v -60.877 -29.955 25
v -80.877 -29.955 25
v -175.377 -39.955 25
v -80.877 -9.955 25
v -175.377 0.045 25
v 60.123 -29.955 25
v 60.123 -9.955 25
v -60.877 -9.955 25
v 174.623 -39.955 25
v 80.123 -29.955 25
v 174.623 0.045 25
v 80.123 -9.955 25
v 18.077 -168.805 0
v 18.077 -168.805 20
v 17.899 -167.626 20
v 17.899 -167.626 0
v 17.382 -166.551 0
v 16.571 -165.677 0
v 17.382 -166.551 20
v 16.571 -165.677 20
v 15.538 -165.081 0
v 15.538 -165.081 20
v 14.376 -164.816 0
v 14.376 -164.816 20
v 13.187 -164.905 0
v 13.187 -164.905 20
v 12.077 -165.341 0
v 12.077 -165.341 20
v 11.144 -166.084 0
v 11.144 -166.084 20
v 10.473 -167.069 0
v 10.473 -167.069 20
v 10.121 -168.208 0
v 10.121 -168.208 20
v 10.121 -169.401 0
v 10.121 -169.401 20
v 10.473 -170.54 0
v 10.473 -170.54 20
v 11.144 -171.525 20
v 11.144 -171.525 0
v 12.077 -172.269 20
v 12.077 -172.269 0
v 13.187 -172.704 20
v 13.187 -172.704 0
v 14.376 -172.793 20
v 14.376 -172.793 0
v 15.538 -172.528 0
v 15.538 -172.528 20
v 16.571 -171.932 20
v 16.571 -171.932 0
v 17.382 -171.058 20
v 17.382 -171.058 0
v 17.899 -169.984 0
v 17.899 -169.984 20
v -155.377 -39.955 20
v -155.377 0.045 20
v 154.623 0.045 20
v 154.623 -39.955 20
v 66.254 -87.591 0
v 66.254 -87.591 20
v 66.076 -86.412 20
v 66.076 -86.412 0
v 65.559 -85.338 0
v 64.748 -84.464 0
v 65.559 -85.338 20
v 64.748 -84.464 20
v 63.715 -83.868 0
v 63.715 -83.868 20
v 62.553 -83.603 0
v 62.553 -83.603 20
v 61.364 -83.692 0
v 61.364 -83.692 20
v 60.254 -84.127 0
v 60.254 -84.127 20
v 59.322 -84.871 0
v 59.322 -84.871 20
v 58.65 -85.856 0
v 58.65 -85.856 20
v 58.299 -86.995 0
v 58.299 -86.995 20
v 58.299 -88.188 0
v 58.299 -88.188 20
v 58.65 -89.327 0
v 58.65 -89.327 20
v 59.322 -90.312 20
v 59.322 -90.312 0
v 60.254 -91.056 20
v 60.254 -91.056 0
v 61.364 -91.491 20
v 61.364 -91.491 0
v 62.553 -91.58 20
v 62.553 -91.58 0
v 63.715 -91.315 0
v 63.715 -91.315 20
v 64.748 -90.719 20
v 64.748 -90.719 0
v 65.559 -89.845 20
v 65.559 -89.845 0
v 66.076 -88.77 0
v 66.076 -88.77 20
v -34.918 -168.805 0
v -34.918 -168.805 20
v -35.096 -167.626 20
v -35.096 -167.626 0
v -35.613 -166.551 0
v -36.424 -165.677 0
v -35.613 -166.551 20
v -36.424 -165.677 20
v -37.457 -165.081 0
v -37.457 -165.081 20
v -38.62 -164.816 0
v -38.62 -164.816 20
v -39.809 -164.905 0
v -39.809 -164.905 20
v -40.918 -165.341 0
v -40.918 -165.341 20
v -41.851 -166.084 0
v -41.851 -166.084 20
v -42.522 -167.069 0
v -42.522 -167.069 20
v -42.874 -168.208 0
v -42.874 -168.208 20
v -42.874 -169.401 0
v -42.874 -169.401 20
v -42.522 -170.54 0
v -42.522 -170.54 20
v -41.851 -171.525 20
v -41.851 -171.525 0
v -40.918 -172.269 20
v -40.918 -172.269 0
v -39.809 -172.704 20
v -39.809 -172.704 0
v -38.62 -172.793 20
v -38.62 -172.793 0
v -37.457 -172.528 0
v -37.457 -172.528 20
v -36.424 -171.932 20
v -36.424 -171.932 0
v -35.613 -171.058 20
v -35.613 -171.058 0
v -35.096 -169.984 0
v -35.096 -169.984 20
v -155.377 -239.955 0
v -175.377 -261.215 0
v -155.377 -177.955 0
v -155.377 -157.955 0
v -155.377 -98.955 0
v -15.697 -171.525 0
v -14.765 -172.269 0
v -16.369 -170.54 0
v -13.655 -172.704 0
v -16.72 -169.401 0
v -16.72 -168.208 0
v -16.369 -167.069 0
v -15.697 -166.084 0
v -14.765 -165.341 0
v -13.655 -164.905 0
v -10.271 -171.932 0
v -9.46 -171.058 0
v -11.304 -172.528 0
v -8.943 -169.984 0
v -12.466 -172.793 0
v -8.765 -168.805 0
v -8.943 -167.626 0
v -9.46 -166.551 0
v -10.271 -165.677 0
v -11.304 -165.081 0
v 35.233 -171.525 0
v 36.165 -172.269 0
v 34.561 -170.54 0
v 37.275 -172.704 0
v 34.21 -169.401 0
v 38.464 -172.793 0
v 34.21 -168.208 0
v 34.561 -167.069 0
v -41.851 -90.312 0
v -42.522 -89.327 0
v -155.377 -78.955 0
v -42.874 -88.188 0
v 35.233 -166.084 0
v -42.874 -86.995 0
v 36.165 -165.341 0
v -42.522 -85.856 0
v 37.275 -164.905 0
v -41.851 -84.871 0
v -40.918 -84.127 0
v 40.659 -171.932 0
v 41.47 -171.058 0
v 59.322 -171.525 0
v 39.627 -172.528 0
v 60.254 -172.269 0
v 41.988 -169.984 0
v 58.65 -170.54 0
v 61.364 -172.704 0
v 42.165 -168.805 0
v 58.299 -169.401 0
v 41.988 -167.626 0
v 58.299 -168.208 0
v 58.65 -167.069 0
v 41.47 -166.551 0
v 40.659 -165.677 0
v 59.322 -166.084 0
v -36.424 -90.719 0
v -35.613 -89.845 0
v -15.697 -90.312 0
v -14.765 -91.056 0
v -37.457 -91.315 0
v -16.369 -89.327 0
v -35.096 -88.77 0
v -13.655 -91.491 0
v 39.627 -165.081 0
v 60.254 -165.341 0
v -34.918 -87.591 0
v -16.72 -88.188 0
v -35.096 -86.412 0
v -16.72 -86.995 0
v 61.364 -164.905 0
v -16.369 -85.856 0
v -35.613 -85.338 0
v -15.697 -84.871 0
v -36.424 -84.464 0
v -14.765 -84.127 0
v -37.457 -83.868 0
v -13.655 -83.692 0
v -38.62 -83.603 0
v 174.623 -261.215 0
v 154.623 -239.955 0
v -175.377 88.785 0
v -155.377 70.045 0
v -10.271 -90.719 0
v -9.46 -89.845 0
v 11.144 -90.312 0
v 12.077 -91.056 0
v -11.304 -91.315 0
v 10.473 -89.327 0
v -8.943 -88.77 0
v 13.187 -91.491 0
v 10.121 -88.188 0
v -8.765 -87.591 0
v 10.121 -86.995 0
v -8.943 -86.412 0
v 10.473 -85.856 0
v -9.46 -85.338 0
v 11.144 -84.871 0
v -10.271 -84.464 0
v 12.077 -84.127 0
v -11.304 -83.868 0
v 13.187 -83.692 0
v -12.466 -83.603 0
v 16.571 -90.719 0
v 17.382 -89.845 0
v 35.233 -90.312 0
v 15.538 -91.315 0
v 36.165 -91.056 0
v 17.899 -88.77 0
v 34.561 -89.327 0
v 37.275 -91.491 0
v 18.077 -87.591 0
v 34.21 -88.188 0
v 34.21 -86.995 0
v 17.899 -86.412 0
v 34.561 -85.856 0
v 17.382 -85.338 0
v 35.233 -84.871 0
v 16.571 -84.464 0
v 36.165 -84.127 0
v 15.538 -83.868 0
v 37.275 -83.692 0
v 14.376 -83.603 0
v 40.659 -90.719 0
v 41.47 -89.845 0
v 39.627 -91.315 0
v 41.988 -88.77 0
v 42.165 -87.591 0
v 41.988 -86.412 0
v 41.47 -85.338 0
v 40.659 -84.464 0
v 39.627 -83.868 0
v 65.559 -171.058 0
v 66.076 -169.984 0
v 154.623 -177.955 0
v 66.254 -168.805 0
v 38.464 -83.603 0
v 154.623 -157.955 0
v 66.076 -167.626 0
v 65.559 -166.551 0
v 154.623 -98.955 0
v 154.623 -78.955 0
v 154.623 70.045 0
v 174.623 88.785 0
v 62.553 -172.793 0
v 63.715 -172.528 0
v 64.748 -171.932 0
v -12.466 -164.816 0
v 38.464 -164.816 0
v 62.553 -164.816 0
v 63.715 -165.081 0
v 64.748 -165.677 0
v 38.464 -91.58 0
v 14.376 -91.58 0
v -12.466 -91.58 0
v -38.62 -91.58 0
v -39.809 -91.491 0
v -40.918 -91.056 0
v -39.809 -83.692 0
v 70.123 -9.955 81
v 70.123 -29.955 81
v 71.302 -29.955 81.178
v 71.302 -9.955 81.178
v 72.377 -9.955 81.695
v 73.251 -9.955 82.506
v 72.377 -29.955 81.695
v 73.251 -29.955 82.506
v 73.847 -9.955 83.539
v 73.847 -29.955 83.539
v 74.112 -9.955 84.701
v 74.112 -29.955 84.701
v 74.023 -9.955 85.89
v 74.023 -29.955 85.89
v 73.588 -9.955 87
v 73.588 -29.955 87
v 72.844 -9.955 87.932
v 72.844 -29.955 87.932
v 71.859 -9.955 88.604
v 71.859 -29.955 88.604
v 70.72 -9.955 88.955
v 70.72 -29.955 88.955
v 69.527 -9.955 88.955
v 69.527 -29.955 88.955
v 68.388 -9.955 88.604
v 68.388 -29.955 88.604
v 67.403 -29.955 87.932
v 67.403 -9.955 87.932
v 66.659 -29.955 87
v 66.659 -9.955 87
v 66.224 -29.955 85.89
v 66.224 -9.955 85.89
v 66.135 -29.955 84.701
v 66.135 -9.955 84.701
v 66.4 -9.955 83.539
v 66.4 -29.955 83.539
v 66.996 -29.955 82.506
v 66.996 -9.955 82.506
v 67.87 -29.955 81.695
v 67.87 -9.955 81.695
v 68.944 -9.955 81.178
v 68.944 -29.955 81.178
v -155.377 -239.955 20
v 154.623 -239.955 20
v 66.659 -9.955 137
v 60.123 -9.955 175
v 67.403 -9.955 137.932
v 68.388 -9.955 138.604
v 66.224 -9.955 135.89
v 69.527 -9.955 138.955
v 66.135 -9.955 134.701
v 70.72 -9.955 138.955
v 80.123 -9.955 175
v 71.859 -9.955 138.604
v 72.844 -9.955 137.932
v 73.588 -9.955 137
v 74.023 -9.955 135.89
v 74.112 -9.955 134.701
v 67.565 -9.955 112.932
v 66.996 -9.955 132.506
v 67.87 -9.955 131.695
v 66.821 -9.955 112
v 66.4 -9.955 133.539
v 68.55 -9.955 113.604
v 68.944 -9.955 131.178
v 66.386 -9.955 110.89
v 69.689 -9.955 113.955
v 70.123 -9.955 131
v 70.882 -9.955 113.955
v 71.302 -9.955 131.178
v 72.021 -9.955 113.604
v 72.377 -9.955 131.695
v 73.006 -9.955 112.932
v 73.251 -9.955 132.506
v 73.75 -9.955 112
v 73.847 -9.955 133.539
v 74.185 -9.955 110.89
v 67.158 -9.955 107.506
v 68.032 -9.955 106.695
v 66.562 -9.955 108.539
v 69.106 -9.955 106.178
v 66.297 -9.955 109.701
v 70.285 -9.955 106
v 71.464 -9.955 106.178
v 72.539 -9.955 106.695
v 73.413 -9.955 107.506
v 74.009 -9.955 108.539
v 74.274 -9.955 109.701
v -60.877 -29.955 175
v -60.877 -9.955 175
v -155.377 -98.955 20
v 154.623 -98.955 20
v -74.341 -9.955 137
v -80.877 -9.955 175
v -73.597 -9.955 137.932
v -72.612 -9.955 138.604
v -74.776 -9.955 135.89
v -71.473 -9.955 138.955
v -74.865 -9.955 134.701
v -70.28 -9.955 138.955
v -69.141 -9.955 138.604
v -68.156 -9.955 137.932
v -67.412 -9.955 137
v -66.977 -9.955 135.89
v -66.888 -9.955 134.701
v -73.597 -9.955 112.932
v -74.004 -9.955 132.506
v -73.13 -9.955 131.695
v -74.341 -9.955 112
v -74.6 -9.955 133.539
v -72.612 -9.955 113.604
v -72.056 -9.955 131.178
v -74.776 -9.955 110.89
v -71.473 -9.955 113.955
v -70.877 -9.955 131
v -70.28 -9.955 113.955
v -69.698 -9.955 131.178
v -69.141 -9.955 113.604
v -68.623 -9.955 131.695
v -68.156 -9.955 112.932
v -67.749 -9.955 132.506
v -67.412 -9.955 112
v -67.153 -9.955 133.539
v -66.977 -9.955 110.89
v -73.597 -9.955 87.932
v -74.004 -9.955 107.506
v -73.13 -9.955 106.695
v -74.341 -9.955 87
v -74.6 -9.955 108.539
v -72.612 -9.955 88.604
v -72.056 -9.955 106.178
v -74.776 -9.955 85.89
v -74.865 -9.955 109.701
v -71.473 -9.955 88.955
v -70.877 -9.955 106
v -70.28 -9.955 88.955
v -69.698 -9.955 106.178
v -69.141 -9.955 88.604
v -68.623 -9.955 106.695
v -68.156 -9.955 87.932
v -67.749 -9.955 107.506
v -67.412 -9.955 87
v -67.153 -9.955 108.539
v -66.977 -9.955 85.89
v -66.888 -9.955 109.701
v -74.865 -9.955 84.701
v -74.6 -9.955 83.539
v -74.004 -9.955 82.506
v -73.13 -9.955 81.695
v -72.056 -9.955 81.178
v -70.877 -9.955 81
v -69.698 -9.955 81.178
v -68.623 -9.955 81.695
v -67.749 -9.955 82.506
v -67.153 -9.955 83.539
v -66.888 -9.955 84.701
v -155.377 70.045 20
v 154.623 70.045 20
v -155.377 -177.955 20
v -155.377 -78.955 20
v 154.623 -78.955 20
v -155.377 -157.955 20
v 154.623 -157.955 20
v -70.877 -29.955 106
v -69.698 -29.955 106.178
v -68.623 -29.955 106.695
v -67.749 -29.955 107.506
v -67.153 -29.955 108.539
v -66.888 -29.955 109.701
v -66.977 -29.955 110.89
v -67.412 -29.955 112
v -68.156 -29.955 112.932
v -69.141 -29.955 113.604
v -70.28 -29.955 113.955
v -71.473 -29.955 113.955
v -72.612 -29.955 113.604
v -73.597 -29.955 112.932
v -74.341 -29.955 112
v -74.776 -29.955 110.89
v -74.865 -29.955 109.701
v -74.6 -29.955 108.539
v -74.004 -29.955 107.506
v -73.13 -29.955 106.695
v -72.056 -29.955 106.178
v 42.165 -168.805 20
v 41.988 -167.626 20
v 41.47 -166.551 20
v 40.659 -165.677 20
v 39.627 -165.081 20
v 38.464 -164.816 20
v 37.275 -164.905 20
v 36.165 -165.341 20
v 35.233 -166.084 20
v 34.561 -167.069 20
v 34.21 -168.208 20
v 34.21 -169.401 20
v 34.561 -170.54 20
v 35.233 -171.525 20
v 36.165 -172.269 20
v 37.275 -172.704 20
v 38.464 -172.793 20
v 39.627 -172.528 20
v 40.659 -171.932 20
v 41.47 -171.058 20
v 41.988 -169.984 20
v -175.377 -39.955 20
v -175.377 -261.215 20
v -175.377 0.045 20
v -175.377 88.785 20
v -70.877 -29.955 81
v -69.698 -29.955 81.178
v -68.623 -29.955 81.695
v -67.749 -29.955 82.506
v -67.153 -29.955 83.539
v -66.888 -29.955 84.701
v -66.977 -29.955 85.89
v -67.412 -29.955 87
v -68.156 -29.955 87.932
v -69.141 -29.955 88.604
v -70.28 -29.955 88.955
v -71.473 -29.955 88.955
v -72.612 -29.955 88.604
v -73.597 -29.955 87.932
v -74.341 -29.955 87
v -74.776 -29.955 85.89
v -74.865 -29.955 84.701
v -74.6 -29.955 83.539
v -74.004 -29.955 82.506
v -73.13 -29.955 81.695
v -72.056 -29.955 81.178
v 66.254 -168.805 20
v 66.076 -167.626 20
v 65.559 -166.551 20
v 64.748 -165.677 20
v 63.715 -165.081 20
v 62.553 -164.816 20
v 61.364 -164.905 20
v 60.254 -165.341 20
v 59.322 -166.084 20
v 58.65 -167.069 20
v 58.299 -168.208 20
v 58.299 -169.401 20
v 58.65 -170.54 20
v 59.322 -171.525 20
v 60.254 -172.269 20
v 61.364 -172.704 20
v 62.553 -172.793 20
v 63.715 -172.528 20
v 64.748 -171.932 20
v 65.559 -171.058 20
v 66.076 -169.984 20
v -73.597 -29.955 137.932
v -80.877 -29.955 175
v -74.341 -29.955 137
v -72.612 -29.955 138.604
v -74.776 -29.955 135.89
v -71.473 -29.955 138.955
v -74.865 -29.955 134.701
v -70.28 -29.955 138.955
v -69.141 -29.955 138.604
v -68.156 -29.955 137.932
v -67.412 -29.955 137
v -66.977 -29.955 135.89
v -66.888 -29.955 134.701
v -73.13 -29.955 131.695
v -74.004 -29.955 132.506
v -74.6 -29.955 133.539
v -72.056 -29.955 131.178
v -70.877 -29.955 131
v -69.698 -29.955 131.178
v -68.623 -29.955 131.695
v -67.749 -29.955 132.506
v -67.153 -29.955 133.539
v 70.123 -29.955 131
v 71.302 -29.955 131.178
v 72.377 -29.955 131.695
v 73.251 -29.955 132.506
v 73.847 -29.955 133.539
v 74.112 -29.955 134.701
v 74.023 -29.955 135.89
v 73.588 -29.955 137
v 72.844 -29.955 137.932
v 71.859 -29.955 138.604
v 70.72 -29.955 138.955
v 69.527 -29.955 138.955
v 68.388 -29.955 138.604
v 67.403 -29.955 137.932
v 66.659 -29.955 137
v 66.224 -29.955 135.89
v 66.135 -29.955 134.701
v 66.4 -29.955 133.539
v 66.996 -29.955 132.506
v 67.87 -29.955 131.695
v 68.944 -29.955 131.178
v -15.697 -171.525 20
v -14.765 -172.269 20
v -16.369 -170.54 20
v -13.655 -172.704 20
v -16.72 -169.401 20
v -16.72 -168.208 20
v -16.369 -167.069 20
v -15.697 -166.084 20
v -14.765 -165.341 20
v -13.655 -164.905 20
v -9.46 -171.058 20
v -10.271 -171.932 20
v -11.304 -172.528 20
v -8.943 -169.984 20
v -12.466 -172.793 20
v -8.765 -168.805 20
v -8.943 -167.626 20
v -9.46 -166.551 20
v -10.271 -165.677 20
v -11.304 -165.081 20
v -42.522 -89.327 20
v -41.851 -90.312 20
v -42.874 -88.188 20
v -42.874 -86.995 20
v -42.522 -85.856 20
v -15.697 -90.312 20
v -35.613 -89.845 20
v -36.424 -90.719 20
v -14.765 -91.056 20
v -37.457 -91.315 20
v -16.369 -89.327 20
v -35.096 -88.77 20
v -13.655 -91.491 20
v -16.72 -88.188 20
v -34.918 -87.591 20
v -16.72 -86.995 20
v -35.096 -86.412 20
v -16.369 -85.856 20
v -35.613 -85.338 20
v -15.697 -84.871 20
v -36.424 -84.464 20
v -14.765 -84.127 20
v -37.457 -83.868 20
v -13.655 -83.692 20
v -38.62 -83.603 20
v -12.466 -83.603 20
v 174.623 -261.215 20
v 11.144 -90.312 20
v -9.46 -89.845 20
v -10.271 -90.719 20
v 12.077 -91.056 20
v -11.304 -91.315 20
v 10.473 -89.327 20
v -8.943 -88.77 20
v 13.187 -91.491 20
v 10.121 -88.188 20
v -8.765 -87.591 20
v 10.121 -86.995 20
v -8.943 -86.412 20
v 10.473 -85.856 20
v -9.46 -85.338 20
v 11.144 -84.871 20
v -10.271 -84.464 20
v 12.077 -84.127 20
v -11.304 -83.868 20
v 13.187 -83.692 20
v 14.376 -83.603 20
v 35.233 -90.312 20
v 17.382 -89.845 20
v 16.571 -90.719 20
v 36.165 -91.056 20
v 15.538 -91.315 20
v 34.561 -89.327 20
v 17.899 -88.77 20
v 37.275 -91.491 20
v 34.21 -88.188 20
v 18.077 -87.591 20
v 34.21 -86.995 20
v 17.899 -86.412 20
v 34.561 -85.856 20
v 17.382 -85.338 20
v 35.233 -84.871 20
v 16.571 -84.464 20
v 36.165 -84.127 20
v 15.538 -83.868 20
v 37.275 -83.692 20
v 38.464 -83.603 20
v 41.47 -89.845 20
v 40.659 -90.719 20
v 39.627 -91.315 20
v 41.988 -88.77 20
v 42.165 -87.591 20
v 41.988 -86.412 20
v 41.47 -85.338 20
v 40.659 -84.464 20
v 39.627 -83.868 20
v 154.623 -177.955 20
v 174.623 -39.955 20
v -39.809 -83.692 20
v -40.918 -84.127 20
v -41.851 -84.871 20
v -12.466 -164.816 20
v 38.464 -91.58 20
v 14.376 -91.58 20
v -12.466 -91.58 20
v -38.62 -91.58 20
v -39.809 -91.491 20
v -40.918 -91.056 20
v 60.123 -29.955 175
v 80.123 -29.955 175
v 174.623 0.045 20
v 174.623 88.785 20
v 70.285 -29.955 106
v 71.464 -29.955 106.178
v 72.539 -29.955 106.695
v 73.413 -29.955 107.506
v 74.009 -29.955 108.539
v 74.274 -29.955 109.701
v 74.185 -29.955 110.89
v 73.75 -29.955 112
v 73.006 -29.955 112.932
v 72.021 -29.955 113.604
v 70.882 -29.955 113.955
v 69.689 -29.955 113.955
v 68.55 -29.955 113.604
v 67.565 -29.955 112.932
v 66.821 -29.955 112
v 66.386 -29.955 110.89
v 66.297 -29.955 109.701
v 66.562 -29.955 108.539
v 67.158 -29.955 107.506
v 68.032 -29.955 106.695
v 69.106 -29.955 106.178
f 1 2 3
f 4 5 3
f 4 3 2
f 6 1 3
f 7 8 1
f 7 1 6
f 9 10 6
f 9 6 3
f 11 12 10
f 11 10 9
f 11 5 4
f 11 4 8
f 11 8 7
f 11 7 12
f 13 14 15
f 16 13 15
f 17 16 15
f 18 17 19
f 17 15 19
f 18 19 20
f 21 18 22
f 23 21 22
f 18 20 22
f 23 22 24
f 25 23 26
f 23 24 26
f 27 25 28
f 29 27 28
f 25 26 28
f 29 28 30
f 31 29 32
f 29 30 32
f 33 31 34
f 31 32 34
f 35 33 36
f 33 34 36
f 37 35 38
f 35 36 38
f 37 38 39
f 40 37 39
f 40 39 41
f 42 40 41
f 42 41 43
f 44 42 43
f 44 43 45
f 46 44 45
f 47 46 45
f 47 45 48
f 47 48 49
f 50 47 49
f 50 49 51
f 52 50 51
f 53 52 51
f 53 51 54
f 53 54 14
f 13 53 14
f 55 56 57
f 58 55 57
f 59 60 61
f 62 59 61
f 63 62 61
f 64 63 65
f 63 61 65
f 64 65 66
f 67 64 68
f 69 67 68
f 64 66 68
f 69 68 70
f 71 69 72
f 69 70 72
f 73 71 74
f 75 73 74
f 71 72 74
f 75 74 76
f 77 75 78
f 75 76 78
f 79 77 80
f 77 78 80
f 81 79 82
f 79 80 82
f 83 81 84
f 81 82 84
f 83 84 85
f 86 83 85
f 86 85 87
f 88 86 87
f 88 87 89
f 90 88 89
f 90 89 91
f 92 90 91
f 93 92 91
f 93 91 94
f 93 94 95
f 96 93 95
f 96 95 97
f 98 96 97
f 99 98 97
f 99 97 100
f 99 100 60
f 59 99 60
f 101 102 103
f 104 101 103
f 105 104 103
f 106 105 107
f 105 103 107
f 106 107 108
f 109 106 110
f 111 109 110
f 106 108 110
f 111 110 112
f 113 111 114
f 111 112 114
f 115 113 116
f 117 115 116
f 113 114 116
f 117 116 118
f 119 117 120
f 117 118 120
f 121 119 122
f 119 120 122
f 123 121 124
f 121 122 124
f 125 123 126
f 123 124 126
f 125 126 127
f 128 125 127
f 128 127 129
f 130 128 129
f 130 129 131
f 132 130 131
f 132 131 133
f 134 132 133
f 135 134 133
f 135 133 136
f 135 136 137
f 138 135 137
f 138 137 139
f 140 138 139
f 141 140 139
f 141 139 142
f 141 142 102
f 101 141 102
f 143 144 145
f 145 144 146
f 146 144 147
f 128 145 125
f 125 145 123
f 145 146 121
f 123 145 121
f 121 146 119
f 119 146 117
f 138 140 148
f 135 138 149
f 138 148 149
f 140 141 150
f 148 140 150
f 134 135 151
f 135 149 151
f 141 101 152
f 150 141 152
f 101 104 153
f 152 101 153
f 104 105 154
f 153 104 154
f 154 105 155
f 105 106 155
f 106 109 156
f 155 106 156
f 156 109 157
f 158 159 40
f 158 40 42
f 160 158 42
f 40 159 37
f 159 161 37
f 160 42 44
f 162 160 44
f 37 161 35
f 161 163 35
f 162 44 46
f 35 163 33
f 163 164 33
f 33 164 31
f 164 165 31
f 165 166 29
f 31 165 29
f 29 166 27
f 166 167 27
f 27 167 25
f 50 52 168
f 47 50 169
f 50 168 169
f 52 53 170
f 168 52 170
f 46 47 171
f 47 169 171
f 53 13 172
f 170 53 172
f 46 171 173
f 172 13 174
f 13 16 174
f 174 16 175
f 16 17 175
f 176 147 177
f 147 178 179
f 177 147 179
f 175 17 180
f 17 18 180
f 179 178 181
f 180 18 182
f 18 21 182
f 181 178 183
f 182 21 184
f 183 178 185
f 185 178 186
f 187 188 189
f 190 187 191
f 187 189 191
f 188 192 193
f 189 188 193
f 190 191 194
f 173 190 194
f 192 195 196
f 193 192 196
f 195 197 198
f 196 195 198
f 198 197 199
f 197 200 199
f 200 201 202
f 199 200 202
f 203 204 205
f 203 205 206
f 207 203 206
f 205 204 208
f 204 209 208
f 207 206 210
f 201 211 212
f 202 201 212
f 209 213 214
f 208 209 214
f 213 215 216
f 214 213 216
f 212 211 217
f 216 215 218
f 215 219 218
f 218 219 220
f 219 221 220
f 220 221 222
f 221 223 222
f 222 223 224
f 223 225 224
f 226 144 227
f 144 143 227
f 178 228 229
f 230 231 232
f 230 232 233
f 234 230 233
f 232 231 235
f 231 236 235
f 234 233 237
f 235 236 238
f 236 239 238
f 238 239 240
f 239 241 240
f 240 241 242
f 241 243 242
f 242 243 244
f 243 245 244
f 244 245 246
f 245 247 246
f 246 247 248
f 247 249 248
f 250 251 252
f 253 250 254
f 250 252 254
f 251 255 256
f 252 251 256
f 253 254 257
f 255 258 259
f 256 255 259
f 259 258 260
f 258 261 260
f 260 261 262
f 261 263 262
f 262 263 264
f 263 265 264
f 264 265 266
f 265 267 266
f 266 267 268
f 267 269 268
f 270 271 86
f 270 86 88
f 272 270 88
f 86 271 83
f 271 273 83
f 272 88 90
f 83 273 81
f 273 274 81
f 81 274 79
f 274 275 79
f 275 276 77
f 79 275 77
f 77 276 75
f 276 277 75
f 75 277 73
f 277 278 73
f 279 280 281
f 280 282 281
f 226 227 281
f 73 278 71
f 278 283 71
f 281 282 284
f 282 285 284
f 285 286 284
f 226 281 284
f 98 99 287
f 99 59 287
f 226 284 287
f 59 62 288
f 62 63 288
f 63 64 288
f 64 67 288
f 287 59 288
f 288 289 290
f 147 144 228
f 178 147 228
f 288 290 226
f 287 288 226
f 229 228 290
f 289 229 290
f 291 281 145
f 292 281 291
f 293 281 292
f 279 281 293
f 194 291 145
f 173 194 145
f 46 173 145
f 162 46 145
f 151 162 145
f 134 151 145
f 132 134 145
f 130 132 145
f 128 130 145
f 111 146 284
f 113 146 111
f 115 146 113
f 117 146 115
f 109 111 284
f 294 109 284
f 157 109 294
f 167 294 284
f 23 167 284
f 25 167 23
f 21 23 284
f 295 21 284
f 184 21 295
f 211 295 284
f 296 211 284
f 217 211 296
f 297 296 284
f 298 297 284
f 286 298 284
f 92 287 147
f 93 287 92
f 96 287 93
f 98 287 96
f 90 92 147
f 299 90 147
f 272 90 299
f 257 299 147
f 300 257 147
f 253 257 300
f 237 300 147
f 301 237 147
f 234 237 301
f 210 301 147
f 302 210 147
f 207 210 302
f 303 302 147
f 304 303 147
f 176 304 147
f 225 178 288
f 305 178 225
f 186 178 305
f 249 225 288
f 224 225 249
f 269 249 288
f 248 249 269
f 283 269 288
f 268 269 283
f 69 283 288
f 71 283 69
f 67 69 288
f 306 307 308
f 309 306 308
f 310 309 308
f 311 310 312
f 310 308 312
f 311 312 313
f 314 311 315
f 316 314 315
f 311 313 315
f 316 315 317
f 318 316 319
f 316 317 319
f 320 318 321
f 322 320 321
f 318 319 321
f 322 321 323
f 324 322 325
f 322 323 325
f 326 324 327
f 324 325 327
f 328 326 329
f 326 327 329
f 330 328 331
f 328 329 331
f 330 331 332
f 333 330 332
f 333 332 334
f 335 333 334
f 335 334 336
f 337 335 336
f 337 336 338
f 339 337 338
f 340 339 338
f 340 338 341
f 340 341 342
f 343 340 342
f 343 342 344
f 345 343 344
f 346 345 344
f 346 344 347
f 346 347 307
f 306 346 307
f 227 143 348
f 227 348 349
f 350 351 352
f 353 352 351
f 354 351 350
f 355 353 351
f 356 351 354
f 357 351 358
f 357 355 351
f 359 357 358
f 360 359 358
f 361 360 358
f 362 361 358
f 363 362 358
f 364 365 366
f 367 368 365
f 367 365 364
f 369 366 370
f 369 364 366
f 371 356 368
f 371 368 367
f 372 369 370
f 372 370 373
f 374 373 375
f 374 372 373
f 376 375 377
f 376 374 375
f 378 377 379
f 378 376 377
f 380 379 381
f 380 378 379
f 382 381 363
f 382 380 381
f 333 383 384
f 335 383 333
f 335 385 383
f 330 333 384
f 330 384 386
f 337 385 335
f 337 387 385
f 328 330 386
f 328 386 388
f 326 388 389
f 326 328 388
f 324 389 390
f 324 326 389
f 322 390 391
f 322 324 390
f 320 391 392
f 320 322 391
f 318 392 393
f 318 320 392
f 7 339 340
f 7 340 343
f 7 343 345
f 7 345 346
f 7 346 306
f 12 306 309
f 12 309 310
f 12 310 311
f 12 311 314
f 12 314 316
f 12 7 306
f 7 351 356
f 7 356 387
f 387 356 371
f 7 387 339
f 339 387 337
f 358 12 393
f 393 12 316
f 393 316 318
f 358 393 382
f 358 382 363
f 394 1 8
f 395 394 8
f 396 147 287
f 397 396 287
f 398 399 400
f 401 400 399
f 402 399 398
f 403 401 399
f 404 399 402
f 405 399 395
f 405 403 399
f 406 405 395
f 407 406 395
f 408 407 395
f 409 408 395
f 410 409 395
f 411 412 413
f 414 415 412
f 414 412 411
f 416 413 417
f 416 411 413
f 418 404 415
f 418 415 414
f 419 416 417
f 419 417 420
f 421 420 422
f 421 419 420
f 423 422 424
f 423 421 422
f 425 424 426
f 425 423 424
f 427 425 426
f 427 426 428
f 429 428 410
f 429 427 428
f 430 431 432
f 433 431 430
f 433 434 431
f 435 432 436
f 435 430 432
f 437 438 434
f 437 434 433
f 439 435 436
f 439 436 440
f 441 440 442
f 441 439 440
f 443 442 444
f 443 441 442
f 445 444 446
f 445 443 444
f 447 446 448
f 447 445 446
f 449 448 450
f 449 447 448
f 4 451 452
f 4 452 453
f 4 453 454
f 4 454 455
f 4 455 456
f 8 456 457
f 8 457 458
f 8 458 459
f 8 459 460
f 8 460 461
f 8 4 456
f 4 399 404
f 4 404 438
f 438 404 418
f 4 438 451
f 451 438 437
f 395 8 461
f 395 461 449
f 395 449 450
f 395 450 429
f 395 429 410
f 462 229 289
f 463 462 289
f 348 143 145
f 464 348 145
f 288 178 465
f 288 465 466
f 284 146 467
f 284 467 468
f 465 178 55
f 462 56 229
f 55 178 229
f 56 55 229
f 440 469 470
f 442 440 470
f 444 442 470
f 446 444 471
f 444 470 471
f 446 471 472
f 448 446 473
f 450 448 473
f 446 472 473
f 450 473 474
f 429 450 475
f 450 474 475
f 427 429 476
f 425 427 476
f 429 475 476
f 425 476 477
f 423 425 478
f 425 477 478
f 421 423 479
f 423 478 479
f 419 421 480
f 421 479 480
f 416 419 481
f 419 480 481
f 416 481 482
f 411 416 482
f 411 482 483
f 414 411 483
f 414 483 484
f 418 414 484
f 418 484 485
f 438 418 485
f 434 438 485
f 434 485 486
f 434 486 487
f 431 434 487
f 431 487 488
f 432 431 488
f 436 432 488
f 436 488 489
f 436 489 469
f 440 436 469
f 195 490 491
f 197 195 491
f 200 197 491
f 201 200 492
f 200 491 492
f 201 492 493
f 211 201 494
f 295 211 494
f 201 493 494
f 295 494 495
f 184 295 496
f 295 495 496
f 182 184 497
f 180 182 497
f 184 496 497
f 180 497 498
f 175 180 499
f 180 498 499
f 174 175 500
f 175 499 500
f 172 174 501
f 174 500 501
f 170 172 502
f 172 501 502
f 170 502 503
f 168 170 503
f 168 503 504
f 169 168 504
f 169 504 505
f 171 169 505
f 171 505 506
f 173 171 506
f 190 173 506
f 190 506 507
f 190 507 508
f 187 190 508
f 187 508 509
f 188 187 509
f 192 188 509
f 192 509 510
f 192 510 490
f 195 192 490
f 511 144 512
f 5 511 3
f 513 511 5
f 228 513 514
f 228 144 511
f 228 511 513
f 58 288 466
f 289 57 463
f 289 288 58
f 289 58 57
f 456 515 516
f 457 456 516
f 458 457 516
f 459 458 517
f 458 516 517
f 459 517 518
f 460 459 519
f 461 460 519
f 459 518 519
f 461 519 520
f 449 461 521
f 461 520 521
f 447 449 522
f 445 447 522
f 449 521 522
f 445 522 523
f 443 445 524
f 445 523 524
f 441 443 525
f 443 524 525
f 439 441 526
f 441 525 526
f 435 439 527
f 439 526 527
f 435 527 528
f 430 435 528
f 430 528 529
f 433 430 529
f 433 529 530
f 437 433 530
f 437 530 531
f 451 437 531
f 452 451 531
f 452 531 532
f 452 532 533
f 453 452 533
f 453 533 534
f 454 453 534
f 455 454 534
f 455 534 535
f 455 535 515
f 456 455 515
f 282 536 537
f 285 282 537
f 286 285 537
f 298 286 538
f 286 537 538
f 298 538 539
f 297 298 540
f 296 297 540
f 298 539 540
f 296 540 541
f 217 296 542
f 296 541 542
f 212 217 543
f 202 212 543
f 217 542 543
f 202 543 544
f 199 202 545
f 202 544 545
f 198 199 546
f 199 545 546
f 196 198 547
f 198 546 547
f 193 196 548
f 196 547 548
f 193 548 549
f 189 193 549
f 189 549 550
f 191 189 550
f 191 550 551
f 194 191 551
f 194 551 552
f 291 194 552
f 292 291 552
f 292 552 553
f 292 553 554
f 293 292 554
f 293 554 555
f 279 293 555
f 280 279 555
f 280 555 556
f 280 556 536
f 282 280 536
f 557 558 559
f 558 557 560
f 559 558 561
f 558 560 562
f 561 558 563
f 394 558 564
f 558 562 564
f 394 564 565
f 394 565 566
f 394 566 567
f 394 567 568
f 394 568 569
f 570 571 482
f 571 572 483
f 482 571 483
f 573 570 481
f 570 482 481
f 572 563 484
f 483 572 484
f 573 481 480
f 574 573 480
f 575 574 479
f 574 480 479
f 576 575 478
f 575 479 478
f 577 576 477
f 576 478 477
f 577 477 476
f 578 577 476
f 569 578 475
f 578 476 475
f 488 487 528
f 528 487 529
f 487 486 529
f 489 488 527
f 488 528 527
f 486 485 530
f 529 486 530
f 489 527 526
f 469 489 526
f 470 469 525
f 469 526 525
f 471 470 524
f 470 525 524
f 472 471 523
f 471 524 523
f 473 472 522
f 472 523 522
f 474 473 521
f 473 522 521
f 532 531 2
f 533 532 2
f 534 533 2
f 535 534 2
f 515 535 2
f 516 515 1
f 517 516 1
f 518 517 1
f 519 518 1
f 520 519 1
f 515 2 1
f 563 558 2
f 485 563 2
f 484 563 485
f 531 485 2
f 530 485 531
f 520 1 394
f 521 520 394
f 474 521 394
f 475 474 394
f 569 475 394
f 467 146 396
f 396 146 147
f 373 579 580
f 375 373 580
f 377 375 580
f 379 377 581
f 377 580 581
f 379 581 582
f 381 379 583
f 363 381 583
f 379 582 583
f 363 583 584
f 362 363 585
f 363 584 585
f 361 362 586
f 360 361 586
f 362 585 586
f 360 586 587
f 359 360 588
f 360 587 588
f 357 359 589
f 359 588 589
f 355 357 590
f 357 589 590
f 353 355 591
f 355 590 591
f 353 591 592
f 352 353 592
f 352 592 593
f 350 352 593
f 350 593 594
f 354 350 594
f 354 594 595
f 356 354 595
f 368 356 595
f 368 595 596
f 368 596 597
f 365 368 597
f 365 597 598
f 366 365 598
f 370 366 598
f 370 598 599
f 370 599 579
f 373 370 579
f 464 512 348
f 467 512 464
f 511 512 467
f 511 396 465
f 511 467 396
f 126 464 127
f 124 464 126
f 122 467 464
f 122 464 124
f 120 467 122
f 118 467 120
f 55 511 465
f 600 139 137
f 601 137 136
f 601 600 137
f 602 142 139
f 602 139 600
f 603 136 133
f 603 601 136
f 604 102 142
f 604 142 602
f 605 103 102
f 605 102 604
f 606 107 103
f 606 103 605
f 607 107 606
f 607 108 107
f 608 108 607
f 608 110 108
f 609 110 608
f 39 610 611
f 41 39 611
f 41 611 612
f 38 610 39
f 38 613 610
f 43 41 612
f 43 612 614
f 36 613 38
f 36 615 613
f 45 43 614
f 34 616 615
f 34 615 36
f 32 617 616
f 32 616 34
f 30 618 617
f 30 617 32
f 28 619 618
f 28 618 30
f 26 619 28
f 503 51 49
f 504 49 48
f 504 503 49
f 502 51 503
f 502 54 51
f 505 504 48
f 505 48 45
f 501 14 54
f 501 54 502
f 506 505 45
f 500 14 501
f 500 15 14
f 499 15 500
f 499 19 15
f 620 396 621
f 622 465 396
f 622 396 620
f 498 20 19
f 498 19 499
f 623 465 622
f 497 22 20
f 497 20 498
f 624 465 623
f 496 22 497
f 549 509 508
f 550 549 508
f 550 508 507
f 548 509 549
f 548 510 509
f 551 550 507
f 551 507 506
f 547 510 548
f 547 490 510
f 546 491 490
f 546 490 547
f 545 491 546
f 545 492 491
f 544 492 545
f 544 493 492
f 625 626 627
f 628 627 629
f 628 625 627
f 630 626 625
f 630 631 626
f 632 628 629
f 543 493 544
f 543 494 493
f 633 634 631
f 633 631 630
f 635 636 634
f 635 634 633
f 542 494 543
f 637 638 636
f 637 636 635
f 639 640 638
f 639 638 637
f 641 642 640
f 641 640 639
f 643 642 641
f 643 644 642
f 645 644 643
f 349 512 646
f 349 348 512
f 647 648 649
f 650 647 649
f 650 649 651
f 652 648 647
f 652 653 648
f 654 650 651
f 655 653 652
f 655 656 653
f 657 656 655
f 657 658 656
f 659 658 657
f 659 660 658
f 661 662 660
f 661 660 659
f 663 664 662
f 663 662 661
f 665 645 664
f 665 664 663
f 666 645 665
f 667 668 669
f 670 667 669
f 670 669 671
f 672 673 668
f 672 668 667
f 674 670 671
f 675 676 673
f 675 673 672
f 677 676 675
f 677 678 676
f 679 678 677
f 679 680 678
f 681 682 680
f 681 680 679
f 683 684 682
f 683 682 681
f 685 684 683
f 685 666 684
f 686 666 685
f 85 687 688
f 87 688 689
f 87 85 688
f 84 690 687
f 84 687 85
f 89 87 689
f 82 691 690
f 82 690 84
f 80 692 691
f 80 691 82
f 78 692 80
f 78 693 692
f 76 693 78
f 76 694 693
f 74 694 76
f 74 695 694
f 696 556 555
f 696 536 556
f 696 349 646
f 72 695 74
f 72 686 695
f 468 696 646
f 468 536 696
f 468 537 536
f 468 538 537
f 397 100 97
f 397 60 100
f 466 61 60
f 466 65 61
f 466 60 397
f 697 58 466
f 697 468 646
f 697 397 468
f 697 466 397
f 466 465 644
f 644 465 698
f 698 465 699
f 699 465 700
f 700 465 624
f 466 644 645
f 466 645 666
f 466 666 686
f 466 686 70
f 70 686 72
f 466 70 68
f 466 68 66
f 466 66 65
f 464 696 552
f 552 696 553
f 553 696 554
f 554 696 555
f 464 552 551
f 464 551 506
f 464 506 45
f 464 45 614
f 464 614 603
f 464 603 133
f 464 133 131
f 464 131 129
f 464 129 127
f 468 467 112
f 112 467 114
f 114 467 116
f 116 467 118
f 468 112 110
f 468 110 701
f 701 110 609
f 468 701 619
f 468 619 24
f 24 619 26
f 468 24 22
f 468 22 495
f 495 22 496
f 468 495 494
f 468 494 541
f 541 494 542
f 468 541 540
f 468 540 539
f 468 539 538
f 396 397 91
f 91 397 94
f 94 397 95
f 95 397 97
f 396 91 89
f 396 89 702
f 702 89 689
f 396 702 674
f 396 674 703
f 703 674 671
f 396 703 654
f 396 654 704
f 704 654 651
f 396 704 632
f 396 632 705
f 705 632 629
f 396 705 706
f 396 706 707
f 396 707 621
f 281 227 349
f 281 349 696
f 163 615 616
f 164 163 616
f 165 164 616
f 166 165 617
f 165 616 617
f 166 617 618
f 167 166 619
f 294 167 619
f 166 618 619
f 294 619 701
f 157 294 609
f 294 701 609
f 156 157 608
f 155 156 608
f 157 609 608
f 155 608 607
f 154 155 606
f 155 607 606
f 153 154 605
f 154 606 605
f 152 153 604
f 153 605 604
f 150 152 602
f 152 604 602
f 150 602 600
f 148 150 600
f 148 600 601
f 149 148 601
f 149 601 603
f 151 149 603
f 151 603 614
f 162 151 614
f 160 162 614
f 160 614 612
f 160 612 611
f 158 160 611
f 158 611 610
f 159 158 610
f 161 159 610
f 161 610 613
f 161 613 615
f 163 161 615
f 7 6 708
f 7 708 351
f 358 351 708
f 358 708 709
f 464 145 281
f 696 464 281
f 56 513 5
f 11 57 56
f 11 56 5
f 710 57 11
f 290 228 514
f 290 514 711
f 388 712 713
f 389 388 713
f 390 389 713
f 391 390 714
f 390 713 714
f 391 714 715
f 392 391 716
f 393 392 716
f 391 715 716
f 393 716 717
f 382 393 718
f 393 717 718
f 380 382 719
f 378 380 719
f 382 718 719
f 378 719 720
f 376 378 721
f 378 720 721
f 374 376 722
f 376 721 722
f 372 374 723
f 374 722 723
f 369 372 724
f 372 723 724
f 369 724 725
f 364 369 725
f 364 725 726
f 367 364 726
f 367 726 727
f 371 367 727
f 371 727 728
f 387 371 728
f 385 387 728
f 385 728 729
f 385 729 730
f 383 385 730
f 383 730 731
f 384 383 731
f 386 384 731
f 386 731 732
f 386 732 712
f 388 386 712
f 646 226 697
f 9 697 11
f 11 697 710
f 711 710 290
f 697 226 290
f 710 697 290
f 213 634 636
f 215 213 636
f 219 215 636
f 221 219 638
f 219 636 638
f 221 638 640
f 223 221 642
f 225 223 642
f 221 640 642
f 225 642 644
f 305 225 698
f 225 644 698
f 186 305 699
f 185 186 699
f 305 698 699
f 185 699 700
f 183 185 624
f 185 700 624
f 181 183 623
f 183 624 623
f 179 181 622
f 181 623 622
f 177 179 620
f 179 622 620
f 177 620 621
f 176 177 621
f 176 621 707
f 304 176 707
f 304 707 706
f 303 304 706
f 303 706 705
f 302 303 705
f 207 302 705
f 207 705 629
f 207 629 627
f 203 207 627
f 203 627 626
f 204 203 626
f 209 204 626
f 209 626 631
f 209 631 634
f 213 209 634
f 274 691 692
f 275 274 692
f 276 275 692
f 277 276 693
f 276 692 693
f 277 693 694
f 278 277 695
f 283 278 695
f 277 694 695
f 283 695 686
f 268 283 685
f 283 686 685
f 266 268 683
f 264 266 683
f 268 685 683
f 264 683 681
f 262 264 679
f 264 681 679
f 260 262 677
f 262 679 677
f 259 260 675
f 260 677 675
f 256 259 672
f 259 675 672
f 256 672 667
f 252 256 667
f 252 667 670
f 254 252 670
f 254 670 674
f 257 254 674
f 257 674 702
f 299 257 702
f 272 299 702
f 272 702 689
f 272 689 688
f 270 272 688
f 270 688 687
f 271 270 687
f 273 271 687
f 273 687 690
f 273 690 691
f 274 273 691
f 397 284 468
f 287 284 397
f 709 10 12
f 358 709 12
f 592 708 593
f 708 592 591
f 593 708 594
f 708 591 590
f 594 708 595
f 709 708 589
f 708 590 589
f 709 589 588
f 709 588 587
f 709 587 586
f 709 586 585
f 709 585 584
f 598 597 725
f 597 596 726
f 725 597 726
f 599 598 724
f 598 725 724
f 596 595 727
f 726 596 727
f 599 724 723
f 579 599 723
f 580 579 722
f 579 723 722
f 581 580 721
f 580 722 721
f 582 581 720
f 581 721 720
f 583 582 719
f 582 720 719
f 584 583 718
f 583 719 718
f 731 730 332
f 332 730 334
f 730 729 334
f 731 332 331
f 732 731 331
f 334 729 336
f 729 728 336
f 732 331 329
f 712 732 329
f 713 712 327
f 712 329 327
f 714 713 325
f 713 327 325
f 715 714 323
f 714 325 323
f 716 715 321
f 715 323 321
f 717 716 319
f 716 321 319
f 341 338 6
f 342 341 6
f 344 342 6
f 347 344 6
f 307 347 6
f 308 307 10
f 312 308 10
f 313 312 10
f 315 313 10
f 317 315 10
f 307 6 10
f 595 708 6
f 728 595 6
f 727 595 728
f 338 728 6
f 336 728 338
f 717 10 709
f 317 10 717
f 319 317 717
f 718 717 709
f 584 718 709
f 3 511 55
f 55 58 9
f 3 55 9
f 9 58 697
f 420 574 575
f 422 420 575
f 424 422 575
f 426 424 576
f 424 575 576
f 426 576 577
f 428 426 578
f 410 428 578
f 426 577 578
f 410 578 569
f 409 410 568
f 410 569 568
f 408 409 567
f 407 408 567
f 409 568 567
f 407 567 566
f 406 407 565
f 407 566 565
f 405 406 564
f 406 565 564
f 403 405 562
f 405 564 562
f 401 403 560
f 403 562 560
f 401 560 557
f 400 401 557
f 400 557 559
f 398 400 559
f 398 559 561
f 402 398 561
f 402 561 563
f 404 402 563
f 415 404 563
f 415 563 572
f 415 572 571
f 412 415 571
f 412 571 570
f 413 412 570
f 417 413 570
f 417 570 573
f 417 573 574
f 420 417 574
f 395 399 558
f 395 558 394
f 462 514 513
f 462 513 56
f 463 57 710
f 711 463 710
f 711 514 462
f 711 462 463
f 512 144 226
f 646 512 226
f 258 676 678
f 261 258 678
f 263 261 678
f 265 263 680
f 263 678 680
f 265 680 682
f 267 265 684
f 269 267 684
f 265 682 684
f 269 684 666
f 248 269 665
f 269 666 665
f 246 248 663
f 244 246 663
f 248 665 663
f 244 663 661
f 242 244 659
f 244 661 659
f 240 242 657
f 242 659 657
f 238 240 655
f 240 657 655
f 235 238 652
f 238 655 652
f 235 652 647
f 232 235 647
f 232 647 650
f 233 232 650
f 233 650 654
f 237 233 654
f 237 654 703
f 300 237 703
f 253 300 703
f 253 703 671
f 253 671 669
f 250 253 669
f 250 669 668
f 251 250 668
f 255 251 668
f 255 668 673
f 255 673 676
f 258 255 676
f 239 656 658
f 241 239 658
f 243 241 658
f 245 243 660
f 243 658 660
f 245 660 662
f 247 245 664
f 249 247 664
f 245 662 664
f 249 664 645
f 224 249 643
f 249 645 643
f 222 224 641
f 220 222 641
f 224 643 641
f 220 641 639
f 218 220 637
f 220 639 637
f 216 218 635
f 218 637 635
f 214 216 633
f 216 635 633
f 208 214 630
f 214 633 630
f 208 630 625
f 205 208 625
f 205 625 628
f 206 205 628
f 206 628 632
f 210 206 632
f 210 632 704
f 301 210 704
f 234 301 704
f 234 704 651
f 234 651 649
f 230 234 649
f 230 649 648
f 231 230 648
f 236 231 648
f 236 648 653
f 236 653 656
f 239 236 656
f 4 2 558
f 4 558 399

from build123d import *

# Parameters (mm, degrees)
SKETCH1_W           = 350
SKETCH1_H           = 350
SKETCH1_W_2         = 310
SKETCH1_H_2         = 59
SKETCH1_H_3         = 149
SKETCH1_H_4         = 62
BOSS_EXTRUDE1_DEPTH = 20
SKETCH2_W           = 350
SKETCH2_H           = 40
BOSS_EXTRUDE2_DEPTH = 5
SKETCH3_W           = 20
SKETCH3_H           = 20
BOSS_EXTRUDE4_DEPTH = 150
SKETCH4_R           = 4
CUT_EXTRUDE1_DEPTH  = 339.914592404
SKETCH5_R           = 4
CUT_EXTRUDE2_DEPTH  = 351.735228342
SKETCH6_R           = 4
CUT_EXTRUDE3_DEPTH  = 339.914592404


with BuildPart() as part:
    # Sketch1 → Boss-Extrude1 (new body)
    with BuildSketch(Plane.XY):
        with Locations((-0.376590763, -86.214953271)):
            Rectangle(SKETCH1_W, SKETCH1_H)
        with Locations((-0.376590763, -128.45502947)):
            Rectangle(SKETCH1_W_2, SKETCH1_H_2, mode=Mode.SUBTRACT)
        with Locations((-0.376590763, -4.45502947)):
            Rectangle(SKETCH1_W_2, SKETCH1_H_3, mode=Mode.SUBTRACT)
        with Locations((-0.376590763, -208.95502947)):
            Rectangle(SKETCH1_W_2, SKETCH1_H_4, mode=Mode.SUBTRACT)
    extrude(amount=BOSS_EXTRUDE1_DEPTH)

    # Sketch2 → Boss-Extrude2 (add)
    with BuildSketch(Plane.XY.offset(20)):
        with Locations((-0.376590763, -19.95502947)):
            Rectangle(SKETCH2_W, SKETCH2_H)
    extrude(amount=BOSS_EXTRUDE2_DEPTH)

    # Sketch3 → Boss-Extrude4 (add)
    with BuildSketch(Plane.XY.offset(25)):
        with Locations((-70.876590763, -19.95502947)):
            Rectangle(SKETCH3_W, SKETCH3_H)
        with Locations((70.123409237, -19.95502947)):
            Rectangle(SKETCH3_W, SKETCH3_H)
    extrude(amount=BOSS_EXTRUDE4_DEPTH)

    # Sketch4 → Cut-Extrude1 (cut, through all)
    with BuildSketch(Plane.XZ.offset(29.95502947)):
        with Locations(Location((-70.876590763, 135, 0), (0, 0, 270))):
            Circle(SKETCH4_R)
        with Locations(Location((-70.876590763, 85, 0), (0, 0, 270))):
            Circle(SKETCH4_R)
        with Locations(Location((70.123409237, 135, 0), (0, 0, 270))):
            Circle(SKETCH4_R)
        with Locations(Location((70.123409237, 85, 0), (0, 0, 270))):
            Circle(SKETCH4_R)
    extrude(amount=-CUT_EXTRUDE1_DEPTH, mode=Mode.SUBTRACT)

    # Sketch5 → Cut-Extrude2 (cut, through all)
    with BuildSketch(Plane.XY.offset(20)):
        with Locations((-38.918433774, -87.591447664)):
            Circle(SKETCH5_R)
        with Locations((-12.765040303, -87.591447664)):
            Circle(SKETCH5_R)
        with Locations((14.076600366, -87.591447664)):
            Circle(SKETCH5_R)
        with Locations((38.165252248, -87.591447664)):
            Circle(SKETCH5_R)
        with Locations((62.25390413, -87.591447664)):
            Circle(SKETCH5_R)
        with Locations((62.25390413, -168.804616866)):
            Circle(SKETCH5_R)
        with Locations((38.165252248, -168.804616866)):
            Circle(SKETCH5_R)
        with Locations((14.076600366, -168.804616866)):
            Circle(SKETCH5_R)
        with Locations((-12.765040303, -168.804616866)):
            Circle(SKETCH5_R)
        with Locations((-38.918433774, -168.804616866)):
            Circle(SKETCH5_R)
    extrude(amount=-CUT_EXTRUDE2_DEPTH, mode=Mode.SUBTRACT)

    # Sketch6 → Cut-Extrude3 (cut, through all)
    with BuildSketch(Plane.XZ.offset(29.95502947)):
        with Locations(Location((-70.876590763, 110, 0), (0, 0, 270))):
            Circle(SKETCH6_R)
        with Locations(Location((70.285399923, 110, 0), (0, 0, 270))):
            Circle(SKETCH6_R)
    extrude(amount=-CUT_EXTRUDE3_DEPTH, mode=Mode.SUBTRACT)


solid = part.part
